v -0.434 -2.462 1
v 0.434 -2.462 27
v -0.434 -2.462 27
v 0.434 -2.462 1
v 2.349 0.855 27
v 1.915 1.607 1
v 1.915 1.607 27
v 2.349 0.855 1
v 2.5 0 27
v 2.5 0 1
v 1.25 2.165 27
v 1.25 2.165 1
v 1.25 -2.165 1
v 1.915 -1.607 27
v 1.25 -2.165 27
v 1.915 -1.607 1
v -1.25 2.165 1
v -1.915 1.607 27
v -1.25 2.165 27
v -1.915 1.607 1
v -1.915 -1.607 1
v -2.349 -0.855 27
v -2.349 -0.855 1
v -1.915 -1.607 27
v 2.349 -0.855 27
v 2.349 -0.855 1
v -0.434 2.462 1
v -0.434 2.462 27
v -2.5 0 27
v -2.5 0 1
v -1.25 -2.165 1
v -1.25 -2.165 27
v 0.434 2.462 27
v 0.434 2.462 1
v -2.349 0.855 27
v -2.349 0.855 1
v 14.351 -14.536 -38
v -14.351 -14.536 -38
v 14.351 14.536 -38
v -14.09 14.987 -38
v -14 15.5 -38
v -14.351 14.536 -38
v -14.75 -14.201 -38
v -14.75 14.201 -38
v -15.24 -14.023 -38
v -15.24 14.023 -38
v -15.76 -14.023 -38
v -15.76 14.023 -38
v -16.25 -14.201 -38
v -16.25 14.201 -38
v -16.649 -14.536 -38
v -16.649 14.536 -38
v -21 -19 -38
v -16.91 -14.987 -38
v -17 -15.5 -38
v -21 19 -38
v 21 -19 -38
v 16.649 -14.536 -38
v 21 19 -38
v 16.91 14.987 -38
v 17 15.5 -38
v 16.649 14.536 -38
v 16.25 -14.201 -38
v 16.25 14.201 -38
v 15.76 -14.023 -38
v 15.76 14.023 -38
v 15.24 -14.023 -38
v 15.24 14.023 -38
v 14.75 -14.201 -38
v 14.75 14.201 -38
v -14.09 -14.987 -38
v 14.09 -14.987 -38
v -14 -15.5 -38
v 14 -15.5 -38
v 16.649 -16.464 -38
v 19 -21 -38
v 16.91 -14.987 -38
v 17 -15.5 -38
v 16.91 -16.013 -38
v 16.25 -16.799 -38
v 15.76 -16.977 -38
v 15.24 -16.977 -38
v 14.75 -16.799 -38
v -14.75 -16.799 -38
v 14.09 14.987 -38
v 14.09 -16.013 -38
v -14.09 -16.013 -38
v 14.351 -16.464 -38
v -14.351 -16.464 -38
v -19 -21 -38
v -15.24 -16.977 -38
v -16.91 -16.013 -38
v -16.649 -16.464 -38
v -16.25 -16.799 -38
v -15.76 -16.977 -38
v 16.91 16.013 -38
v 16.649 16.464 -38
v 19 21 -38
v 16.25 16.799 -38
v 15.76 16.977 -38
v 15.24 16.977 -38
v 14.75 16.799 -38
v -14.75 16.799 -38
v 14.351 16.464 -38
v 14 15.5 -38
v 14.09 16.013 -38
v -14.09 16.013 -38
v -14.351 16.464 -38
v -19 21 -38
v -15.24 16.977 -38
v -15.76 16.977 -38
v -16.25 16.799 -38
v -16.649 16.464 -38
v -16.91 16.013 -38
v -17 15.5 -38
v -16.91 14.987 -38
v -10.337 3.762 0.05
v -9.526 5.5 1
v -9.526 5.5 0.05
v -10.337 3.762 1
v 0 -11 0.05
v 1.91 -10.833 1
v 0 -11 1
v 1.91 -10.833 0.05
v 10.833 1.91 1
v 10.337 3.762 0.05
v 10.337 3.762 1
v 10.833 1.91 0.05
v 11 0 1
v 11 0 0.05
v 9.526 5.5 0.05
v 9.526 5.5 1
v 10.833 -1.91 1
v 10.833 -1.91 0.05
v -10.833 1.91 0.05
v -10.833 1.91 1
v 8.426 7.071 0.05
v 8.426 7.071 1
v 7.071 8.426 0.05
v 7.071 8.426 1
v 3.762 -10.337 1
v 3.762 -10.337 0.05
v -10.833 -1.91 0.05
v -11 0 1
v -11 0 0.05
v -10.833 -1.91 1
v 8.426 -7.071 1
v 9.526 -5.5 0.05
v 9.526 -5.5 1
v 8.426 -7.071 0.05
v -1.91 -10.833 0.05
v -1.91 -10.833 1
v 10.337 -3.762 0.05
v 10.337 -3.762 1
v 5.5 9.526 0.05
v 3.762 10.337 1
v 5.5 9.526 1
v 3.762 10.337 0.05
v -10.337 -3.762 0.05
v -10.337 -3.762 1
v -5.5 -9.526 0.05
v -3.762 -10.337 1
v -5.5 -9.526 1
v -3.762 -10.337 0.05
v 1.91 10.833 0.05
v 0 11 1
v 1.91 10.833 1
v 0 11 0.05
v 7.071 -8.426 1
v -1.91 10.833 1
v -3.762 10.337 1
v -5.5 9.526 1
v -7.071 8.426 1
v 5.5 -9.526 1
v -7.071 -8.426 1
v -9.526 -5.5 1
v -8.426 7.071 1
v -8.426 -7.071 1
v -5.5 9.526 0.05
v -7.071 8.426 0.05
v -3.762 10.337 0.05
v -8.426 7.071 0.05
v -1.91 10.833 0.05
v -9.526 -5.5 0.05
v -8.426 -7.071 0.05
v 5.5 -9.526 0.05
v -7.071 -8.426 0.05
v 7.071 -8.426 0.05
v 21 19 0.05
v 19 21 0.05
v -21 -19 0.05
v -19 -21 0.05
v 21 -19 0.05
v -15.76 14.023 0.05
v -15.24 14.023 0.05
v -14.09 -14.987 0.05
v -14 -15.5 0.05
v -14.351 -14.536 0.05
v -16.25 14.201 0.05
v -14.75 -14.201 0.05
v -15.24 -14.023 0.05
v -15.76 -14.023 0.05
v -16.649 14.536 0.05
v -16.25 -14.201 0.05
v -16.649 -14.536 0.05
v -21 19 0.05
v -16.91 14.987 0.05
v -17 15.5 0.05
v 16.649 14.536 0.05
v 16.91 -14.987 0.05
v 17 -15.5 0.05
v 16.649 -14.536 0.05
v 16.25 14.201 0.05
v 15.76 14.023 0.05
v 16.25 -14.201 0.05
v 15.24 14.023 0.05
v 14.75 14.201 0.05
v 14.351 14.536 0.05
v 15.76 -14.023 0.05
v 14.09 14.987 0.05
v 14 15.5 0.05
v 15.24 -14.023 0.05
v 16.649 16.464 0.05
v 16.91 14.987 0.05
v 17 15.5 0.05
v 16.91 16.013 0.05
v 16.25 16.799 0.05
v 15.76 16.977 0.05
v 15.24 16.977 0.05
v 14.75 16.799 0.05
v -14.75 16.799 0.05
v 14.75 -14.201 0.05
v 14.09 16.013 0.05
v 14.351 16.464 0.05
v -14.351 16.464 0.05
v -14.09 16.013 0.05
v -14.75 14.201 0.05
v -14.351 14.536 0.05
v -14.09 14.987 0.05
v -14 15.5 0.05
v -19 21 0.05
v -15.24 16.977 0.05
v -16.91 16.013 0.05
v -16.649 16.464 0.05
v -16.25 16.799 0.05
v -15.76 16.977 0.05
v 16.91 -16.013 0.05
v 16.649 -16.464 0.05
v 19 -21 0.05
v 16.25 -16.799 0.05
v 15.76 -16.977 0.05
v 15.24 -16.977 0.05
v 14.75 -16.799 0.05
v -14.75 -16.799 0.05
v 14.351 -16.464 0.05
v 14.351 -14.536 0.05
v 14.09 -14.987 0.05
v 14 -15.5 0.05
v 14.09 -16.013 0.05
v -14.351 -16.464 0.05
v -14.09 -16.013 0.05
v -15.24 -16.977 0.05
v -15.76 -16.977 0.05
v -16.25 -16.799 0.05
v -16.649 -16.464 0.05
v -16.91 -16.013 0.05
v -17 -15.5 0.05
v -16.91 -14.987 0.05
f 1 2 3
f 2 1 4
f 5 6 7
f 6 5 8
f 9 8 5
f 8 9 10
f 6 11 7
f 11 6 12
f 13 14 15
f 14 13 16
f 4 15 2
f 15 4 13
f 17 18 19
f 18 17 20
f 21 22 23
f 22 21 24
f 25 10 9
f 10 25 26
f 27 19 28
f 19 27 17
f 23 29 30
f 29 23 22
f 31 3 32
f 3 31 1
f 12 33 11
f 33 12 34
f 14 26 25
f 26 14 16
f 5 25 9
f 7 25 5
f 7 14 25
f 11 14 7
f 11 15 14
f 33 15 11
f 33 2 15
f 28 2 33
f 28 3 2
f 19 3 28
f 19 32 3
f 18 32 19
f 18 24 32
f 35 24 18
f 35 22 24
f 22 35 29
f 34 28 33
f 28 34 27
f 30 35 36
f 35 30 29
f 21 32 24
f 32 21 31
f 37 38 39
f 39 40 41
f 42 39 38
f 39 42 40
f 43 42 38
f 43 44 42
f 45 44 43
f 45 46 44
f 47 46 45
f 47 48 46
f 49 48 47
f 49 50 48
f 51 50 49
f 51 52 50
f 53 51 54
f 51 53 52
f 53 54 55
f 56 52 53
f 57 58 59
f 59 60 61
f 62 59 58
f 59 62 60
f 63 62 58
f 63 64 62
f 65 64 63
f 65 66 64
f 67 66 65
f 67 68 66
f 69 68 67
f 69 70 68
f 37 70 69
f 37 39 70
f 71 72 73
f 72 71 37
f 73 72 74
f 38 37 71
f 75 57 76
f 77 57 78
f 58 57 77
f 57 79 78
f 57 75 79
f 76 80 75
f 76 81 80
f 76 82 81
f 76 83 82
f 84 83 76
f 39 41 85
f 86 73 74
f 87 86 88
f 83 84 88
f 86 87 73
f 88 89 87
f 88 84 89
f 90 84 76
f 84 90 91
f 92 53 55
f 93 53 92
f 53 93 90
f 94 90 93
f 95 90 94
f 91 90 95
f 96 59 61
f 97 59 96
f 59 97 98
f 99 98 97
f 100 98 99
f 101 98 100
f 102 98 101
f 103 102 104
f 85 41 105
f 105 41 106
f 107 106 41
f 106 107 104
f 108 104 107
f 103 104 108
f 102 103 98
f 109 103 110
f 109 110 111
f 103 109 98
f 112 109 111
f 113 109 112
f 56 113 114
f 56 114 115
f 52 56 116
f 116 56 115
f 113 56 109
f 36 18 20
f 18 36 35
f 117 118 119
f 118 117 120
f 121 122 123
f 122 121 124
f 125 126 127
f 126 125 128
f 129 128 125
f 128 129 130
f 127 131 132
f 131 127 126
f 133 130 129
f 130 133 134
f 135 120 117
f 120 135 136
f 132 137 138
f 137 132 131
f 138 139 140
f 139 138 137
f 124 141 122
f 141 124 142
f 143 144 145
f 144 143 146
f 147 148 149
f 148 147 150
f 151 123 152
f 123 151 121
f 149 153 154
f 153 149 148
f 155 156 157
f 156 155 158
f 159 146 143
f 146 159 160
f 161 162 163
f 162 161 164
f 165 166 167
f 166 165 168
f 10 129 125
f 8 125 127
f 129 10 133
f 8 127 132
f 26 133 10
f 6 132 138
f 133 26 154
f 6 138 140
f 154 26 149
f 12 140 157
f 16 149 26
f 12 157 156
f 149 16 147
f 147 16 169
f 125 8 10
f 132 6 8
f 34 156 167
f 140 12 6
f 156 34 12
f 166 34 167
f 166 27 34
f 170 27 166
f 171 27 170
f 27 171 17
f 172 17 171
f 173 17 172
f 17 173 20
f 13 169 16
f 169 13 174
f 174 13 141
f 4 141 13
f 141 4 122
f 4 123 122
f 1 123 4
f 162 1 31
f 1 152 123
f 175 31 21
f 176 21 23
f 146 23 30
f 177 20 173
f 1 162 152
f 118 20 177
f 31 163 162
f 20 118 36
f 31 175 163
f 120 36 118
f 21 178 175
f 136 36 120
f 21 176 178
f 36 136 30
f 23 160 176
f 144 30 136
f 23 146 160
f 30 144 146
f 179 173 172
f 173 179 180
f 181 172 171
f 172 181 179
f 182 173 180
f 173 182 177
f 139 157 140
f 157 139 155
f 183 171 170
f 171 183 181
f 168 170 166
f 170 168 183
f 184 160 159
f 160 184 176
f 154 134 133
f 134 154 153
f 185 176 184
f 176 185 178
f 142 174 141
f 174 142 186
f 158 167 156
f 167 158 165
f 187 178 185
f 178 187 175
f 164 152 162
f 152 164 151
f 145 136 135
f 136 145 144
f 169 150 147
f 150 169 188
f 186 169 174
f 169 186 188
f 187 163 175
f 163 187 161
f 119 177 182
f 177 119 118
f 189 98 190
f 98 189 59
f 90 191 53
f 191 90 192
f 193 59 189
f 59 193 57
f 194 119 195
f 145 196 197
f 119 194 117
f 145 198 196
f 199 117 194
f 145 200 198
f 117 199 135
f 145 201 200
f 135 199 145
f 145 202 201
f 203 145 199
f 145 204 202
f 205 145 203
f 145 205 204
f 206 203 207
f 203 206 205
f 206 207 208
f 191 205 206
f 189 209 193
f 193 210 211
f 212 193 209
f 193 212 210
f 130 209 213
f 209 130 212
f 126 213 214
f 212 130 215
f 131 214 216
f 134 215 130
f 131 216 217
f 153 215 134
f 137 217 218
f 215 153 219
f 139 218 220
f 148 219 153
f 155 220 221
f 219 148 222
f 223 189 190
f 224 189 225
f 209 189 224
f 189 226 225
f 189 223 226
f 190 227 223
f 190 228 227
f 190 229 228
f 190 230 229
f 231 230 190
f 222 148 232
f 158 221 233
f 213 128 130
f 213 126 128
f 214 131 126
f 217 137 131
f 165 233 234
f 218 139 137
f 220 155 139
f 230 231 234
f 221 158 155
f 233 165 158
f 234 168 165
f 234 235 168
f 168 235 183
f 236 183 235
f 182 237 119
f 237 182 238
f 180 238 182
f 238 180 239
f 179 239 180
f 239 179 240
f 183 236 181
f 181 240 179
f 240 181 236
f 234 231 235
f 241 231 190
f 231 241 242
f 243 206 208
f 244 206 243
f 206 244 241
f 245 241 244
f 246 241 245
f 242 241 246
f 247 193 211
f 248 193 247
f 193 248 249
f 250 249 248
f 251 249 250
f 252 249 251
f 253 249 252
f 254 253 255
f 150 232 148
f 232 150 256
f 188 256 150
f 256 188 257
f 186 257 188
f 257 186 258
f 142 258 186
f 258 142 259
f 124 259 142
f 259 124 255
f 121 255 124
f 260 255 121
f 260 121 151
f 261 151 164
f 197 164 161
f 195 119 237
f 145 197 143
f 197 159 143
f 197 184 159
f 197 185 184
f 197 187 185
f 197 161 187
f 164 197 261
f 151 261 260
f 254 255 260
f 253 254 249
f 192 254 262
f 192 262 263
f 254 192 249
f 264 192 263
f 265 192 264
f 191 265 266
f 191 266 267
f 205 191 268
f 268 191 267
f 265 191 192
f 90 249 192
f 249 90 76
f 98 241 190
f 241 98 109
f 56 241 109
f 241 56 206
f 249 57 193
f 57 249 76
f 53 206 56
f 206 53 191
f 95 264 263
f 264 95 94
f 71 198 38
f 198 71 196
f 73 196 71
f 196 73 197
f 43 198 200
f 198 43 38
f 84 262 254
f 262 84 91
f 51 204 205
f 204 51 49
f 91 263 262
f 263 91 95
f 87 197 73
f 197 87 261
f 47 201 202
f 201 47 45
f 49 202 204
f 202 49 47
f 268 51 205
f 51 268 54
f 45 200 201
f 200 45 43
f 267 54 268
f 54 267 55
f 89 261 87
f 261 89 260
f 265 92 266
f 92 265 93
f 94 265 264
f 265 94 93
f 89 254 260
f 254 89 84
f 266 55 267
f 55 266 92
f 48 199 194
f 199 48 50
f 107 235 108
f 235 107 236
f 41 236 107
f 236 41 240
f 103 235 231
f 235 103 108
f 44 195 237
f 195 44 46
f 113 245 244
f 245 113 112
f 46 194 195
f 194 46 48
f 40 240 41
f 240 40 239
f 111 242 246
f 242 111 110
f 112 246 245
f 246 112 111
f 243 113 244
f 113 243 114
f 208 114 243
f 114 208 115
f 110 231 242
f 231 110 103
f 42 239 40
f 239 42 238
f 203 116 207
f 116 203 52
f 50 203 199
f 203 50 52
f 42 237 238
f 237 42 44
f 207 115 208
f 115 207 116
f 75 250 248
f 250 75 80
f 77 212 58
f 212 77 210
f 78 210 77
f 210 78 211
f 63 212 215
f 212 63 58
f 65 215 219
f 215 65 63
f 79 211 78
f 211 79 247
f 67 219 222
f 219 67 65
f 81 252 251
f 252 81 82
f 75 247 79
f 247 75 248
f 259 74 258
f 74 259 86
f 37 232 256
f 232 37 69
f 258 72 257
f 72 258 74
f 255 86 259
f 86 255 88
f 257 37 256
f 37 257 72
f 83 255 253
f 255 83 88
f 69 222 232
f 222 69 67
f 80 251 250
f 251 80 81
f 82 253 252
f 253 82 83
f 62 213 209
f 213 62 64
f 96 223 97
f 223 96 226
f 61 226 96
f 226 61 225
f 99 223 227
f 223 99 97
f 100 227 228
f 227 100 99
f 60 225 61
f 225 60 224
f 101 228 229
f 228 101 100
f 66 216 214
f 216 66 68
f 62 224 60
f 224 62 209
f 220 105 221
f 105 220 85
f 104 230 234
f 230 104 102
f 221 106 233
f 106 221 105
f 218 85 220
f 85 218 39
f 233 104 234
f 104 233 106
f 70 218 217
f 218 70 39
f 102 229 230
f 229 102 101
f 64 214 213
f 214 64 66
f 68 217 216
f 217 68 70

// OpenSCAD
motorWidth=42;
motorHeight=38;

slotLenght=8;
slotOffset=(slotLenght -3)/2;

module nema17()
{
	translate([0,0,-38])
	difference()
	{
		union()
		{
			//central axis
			cylinder(r=2.5, h=65, $fn=18);
			cylinder(r=11, h=39, $fn=36);
			translate([-19,-19,0])
				minkowski()
				{
					cylinder(r=2, h=0.05, $fn=4);
					cube([38,38,38]);
				}
		}//union	
		for (xn=[-1,1])
		{
			for (yn=[-1,1])
			{
				translate([15.5*xn, 15.5*yn, -1])
					cylinder(r=1.5, h=60, $fn=18);
				
			}
		}
	}	
	
}
module nema17MountingHoles(height=12)
{
	cylinder(r=11, h=height, $fn=36);
	for (xn=[-1,1])
	{
		for (yn=[-1,1])
		{
			translate([15.5*xn, 15.5*yn, -1])
				cylinder(r=1.5, h=height, $fn=18);
			
		}
	}
}
module nema17MountingSlots(height=12)
{
	hull()
	{
		translate([0,-slotOffset,0]) cylinder(r=11, h=height, $fn=36);
		translate([0,slotOffset,0]) cylinder(r=11, h=height, $fn=36);
	}	
	for (xn=[-1,1])
	{
		for (yn=[-1,1])
		{
			hull()
			{
				translate([15.5*xn, 15.5*yn +slotOffset, -1]) cylinder(r=1.5, h=height, $fn=18);
				translate([15.5*xn, 15.5*yn -slotOffset, -1]) cylinder(r=1.5, h=height, $fn=18);
			}	
		}
	}
}
nema17();
